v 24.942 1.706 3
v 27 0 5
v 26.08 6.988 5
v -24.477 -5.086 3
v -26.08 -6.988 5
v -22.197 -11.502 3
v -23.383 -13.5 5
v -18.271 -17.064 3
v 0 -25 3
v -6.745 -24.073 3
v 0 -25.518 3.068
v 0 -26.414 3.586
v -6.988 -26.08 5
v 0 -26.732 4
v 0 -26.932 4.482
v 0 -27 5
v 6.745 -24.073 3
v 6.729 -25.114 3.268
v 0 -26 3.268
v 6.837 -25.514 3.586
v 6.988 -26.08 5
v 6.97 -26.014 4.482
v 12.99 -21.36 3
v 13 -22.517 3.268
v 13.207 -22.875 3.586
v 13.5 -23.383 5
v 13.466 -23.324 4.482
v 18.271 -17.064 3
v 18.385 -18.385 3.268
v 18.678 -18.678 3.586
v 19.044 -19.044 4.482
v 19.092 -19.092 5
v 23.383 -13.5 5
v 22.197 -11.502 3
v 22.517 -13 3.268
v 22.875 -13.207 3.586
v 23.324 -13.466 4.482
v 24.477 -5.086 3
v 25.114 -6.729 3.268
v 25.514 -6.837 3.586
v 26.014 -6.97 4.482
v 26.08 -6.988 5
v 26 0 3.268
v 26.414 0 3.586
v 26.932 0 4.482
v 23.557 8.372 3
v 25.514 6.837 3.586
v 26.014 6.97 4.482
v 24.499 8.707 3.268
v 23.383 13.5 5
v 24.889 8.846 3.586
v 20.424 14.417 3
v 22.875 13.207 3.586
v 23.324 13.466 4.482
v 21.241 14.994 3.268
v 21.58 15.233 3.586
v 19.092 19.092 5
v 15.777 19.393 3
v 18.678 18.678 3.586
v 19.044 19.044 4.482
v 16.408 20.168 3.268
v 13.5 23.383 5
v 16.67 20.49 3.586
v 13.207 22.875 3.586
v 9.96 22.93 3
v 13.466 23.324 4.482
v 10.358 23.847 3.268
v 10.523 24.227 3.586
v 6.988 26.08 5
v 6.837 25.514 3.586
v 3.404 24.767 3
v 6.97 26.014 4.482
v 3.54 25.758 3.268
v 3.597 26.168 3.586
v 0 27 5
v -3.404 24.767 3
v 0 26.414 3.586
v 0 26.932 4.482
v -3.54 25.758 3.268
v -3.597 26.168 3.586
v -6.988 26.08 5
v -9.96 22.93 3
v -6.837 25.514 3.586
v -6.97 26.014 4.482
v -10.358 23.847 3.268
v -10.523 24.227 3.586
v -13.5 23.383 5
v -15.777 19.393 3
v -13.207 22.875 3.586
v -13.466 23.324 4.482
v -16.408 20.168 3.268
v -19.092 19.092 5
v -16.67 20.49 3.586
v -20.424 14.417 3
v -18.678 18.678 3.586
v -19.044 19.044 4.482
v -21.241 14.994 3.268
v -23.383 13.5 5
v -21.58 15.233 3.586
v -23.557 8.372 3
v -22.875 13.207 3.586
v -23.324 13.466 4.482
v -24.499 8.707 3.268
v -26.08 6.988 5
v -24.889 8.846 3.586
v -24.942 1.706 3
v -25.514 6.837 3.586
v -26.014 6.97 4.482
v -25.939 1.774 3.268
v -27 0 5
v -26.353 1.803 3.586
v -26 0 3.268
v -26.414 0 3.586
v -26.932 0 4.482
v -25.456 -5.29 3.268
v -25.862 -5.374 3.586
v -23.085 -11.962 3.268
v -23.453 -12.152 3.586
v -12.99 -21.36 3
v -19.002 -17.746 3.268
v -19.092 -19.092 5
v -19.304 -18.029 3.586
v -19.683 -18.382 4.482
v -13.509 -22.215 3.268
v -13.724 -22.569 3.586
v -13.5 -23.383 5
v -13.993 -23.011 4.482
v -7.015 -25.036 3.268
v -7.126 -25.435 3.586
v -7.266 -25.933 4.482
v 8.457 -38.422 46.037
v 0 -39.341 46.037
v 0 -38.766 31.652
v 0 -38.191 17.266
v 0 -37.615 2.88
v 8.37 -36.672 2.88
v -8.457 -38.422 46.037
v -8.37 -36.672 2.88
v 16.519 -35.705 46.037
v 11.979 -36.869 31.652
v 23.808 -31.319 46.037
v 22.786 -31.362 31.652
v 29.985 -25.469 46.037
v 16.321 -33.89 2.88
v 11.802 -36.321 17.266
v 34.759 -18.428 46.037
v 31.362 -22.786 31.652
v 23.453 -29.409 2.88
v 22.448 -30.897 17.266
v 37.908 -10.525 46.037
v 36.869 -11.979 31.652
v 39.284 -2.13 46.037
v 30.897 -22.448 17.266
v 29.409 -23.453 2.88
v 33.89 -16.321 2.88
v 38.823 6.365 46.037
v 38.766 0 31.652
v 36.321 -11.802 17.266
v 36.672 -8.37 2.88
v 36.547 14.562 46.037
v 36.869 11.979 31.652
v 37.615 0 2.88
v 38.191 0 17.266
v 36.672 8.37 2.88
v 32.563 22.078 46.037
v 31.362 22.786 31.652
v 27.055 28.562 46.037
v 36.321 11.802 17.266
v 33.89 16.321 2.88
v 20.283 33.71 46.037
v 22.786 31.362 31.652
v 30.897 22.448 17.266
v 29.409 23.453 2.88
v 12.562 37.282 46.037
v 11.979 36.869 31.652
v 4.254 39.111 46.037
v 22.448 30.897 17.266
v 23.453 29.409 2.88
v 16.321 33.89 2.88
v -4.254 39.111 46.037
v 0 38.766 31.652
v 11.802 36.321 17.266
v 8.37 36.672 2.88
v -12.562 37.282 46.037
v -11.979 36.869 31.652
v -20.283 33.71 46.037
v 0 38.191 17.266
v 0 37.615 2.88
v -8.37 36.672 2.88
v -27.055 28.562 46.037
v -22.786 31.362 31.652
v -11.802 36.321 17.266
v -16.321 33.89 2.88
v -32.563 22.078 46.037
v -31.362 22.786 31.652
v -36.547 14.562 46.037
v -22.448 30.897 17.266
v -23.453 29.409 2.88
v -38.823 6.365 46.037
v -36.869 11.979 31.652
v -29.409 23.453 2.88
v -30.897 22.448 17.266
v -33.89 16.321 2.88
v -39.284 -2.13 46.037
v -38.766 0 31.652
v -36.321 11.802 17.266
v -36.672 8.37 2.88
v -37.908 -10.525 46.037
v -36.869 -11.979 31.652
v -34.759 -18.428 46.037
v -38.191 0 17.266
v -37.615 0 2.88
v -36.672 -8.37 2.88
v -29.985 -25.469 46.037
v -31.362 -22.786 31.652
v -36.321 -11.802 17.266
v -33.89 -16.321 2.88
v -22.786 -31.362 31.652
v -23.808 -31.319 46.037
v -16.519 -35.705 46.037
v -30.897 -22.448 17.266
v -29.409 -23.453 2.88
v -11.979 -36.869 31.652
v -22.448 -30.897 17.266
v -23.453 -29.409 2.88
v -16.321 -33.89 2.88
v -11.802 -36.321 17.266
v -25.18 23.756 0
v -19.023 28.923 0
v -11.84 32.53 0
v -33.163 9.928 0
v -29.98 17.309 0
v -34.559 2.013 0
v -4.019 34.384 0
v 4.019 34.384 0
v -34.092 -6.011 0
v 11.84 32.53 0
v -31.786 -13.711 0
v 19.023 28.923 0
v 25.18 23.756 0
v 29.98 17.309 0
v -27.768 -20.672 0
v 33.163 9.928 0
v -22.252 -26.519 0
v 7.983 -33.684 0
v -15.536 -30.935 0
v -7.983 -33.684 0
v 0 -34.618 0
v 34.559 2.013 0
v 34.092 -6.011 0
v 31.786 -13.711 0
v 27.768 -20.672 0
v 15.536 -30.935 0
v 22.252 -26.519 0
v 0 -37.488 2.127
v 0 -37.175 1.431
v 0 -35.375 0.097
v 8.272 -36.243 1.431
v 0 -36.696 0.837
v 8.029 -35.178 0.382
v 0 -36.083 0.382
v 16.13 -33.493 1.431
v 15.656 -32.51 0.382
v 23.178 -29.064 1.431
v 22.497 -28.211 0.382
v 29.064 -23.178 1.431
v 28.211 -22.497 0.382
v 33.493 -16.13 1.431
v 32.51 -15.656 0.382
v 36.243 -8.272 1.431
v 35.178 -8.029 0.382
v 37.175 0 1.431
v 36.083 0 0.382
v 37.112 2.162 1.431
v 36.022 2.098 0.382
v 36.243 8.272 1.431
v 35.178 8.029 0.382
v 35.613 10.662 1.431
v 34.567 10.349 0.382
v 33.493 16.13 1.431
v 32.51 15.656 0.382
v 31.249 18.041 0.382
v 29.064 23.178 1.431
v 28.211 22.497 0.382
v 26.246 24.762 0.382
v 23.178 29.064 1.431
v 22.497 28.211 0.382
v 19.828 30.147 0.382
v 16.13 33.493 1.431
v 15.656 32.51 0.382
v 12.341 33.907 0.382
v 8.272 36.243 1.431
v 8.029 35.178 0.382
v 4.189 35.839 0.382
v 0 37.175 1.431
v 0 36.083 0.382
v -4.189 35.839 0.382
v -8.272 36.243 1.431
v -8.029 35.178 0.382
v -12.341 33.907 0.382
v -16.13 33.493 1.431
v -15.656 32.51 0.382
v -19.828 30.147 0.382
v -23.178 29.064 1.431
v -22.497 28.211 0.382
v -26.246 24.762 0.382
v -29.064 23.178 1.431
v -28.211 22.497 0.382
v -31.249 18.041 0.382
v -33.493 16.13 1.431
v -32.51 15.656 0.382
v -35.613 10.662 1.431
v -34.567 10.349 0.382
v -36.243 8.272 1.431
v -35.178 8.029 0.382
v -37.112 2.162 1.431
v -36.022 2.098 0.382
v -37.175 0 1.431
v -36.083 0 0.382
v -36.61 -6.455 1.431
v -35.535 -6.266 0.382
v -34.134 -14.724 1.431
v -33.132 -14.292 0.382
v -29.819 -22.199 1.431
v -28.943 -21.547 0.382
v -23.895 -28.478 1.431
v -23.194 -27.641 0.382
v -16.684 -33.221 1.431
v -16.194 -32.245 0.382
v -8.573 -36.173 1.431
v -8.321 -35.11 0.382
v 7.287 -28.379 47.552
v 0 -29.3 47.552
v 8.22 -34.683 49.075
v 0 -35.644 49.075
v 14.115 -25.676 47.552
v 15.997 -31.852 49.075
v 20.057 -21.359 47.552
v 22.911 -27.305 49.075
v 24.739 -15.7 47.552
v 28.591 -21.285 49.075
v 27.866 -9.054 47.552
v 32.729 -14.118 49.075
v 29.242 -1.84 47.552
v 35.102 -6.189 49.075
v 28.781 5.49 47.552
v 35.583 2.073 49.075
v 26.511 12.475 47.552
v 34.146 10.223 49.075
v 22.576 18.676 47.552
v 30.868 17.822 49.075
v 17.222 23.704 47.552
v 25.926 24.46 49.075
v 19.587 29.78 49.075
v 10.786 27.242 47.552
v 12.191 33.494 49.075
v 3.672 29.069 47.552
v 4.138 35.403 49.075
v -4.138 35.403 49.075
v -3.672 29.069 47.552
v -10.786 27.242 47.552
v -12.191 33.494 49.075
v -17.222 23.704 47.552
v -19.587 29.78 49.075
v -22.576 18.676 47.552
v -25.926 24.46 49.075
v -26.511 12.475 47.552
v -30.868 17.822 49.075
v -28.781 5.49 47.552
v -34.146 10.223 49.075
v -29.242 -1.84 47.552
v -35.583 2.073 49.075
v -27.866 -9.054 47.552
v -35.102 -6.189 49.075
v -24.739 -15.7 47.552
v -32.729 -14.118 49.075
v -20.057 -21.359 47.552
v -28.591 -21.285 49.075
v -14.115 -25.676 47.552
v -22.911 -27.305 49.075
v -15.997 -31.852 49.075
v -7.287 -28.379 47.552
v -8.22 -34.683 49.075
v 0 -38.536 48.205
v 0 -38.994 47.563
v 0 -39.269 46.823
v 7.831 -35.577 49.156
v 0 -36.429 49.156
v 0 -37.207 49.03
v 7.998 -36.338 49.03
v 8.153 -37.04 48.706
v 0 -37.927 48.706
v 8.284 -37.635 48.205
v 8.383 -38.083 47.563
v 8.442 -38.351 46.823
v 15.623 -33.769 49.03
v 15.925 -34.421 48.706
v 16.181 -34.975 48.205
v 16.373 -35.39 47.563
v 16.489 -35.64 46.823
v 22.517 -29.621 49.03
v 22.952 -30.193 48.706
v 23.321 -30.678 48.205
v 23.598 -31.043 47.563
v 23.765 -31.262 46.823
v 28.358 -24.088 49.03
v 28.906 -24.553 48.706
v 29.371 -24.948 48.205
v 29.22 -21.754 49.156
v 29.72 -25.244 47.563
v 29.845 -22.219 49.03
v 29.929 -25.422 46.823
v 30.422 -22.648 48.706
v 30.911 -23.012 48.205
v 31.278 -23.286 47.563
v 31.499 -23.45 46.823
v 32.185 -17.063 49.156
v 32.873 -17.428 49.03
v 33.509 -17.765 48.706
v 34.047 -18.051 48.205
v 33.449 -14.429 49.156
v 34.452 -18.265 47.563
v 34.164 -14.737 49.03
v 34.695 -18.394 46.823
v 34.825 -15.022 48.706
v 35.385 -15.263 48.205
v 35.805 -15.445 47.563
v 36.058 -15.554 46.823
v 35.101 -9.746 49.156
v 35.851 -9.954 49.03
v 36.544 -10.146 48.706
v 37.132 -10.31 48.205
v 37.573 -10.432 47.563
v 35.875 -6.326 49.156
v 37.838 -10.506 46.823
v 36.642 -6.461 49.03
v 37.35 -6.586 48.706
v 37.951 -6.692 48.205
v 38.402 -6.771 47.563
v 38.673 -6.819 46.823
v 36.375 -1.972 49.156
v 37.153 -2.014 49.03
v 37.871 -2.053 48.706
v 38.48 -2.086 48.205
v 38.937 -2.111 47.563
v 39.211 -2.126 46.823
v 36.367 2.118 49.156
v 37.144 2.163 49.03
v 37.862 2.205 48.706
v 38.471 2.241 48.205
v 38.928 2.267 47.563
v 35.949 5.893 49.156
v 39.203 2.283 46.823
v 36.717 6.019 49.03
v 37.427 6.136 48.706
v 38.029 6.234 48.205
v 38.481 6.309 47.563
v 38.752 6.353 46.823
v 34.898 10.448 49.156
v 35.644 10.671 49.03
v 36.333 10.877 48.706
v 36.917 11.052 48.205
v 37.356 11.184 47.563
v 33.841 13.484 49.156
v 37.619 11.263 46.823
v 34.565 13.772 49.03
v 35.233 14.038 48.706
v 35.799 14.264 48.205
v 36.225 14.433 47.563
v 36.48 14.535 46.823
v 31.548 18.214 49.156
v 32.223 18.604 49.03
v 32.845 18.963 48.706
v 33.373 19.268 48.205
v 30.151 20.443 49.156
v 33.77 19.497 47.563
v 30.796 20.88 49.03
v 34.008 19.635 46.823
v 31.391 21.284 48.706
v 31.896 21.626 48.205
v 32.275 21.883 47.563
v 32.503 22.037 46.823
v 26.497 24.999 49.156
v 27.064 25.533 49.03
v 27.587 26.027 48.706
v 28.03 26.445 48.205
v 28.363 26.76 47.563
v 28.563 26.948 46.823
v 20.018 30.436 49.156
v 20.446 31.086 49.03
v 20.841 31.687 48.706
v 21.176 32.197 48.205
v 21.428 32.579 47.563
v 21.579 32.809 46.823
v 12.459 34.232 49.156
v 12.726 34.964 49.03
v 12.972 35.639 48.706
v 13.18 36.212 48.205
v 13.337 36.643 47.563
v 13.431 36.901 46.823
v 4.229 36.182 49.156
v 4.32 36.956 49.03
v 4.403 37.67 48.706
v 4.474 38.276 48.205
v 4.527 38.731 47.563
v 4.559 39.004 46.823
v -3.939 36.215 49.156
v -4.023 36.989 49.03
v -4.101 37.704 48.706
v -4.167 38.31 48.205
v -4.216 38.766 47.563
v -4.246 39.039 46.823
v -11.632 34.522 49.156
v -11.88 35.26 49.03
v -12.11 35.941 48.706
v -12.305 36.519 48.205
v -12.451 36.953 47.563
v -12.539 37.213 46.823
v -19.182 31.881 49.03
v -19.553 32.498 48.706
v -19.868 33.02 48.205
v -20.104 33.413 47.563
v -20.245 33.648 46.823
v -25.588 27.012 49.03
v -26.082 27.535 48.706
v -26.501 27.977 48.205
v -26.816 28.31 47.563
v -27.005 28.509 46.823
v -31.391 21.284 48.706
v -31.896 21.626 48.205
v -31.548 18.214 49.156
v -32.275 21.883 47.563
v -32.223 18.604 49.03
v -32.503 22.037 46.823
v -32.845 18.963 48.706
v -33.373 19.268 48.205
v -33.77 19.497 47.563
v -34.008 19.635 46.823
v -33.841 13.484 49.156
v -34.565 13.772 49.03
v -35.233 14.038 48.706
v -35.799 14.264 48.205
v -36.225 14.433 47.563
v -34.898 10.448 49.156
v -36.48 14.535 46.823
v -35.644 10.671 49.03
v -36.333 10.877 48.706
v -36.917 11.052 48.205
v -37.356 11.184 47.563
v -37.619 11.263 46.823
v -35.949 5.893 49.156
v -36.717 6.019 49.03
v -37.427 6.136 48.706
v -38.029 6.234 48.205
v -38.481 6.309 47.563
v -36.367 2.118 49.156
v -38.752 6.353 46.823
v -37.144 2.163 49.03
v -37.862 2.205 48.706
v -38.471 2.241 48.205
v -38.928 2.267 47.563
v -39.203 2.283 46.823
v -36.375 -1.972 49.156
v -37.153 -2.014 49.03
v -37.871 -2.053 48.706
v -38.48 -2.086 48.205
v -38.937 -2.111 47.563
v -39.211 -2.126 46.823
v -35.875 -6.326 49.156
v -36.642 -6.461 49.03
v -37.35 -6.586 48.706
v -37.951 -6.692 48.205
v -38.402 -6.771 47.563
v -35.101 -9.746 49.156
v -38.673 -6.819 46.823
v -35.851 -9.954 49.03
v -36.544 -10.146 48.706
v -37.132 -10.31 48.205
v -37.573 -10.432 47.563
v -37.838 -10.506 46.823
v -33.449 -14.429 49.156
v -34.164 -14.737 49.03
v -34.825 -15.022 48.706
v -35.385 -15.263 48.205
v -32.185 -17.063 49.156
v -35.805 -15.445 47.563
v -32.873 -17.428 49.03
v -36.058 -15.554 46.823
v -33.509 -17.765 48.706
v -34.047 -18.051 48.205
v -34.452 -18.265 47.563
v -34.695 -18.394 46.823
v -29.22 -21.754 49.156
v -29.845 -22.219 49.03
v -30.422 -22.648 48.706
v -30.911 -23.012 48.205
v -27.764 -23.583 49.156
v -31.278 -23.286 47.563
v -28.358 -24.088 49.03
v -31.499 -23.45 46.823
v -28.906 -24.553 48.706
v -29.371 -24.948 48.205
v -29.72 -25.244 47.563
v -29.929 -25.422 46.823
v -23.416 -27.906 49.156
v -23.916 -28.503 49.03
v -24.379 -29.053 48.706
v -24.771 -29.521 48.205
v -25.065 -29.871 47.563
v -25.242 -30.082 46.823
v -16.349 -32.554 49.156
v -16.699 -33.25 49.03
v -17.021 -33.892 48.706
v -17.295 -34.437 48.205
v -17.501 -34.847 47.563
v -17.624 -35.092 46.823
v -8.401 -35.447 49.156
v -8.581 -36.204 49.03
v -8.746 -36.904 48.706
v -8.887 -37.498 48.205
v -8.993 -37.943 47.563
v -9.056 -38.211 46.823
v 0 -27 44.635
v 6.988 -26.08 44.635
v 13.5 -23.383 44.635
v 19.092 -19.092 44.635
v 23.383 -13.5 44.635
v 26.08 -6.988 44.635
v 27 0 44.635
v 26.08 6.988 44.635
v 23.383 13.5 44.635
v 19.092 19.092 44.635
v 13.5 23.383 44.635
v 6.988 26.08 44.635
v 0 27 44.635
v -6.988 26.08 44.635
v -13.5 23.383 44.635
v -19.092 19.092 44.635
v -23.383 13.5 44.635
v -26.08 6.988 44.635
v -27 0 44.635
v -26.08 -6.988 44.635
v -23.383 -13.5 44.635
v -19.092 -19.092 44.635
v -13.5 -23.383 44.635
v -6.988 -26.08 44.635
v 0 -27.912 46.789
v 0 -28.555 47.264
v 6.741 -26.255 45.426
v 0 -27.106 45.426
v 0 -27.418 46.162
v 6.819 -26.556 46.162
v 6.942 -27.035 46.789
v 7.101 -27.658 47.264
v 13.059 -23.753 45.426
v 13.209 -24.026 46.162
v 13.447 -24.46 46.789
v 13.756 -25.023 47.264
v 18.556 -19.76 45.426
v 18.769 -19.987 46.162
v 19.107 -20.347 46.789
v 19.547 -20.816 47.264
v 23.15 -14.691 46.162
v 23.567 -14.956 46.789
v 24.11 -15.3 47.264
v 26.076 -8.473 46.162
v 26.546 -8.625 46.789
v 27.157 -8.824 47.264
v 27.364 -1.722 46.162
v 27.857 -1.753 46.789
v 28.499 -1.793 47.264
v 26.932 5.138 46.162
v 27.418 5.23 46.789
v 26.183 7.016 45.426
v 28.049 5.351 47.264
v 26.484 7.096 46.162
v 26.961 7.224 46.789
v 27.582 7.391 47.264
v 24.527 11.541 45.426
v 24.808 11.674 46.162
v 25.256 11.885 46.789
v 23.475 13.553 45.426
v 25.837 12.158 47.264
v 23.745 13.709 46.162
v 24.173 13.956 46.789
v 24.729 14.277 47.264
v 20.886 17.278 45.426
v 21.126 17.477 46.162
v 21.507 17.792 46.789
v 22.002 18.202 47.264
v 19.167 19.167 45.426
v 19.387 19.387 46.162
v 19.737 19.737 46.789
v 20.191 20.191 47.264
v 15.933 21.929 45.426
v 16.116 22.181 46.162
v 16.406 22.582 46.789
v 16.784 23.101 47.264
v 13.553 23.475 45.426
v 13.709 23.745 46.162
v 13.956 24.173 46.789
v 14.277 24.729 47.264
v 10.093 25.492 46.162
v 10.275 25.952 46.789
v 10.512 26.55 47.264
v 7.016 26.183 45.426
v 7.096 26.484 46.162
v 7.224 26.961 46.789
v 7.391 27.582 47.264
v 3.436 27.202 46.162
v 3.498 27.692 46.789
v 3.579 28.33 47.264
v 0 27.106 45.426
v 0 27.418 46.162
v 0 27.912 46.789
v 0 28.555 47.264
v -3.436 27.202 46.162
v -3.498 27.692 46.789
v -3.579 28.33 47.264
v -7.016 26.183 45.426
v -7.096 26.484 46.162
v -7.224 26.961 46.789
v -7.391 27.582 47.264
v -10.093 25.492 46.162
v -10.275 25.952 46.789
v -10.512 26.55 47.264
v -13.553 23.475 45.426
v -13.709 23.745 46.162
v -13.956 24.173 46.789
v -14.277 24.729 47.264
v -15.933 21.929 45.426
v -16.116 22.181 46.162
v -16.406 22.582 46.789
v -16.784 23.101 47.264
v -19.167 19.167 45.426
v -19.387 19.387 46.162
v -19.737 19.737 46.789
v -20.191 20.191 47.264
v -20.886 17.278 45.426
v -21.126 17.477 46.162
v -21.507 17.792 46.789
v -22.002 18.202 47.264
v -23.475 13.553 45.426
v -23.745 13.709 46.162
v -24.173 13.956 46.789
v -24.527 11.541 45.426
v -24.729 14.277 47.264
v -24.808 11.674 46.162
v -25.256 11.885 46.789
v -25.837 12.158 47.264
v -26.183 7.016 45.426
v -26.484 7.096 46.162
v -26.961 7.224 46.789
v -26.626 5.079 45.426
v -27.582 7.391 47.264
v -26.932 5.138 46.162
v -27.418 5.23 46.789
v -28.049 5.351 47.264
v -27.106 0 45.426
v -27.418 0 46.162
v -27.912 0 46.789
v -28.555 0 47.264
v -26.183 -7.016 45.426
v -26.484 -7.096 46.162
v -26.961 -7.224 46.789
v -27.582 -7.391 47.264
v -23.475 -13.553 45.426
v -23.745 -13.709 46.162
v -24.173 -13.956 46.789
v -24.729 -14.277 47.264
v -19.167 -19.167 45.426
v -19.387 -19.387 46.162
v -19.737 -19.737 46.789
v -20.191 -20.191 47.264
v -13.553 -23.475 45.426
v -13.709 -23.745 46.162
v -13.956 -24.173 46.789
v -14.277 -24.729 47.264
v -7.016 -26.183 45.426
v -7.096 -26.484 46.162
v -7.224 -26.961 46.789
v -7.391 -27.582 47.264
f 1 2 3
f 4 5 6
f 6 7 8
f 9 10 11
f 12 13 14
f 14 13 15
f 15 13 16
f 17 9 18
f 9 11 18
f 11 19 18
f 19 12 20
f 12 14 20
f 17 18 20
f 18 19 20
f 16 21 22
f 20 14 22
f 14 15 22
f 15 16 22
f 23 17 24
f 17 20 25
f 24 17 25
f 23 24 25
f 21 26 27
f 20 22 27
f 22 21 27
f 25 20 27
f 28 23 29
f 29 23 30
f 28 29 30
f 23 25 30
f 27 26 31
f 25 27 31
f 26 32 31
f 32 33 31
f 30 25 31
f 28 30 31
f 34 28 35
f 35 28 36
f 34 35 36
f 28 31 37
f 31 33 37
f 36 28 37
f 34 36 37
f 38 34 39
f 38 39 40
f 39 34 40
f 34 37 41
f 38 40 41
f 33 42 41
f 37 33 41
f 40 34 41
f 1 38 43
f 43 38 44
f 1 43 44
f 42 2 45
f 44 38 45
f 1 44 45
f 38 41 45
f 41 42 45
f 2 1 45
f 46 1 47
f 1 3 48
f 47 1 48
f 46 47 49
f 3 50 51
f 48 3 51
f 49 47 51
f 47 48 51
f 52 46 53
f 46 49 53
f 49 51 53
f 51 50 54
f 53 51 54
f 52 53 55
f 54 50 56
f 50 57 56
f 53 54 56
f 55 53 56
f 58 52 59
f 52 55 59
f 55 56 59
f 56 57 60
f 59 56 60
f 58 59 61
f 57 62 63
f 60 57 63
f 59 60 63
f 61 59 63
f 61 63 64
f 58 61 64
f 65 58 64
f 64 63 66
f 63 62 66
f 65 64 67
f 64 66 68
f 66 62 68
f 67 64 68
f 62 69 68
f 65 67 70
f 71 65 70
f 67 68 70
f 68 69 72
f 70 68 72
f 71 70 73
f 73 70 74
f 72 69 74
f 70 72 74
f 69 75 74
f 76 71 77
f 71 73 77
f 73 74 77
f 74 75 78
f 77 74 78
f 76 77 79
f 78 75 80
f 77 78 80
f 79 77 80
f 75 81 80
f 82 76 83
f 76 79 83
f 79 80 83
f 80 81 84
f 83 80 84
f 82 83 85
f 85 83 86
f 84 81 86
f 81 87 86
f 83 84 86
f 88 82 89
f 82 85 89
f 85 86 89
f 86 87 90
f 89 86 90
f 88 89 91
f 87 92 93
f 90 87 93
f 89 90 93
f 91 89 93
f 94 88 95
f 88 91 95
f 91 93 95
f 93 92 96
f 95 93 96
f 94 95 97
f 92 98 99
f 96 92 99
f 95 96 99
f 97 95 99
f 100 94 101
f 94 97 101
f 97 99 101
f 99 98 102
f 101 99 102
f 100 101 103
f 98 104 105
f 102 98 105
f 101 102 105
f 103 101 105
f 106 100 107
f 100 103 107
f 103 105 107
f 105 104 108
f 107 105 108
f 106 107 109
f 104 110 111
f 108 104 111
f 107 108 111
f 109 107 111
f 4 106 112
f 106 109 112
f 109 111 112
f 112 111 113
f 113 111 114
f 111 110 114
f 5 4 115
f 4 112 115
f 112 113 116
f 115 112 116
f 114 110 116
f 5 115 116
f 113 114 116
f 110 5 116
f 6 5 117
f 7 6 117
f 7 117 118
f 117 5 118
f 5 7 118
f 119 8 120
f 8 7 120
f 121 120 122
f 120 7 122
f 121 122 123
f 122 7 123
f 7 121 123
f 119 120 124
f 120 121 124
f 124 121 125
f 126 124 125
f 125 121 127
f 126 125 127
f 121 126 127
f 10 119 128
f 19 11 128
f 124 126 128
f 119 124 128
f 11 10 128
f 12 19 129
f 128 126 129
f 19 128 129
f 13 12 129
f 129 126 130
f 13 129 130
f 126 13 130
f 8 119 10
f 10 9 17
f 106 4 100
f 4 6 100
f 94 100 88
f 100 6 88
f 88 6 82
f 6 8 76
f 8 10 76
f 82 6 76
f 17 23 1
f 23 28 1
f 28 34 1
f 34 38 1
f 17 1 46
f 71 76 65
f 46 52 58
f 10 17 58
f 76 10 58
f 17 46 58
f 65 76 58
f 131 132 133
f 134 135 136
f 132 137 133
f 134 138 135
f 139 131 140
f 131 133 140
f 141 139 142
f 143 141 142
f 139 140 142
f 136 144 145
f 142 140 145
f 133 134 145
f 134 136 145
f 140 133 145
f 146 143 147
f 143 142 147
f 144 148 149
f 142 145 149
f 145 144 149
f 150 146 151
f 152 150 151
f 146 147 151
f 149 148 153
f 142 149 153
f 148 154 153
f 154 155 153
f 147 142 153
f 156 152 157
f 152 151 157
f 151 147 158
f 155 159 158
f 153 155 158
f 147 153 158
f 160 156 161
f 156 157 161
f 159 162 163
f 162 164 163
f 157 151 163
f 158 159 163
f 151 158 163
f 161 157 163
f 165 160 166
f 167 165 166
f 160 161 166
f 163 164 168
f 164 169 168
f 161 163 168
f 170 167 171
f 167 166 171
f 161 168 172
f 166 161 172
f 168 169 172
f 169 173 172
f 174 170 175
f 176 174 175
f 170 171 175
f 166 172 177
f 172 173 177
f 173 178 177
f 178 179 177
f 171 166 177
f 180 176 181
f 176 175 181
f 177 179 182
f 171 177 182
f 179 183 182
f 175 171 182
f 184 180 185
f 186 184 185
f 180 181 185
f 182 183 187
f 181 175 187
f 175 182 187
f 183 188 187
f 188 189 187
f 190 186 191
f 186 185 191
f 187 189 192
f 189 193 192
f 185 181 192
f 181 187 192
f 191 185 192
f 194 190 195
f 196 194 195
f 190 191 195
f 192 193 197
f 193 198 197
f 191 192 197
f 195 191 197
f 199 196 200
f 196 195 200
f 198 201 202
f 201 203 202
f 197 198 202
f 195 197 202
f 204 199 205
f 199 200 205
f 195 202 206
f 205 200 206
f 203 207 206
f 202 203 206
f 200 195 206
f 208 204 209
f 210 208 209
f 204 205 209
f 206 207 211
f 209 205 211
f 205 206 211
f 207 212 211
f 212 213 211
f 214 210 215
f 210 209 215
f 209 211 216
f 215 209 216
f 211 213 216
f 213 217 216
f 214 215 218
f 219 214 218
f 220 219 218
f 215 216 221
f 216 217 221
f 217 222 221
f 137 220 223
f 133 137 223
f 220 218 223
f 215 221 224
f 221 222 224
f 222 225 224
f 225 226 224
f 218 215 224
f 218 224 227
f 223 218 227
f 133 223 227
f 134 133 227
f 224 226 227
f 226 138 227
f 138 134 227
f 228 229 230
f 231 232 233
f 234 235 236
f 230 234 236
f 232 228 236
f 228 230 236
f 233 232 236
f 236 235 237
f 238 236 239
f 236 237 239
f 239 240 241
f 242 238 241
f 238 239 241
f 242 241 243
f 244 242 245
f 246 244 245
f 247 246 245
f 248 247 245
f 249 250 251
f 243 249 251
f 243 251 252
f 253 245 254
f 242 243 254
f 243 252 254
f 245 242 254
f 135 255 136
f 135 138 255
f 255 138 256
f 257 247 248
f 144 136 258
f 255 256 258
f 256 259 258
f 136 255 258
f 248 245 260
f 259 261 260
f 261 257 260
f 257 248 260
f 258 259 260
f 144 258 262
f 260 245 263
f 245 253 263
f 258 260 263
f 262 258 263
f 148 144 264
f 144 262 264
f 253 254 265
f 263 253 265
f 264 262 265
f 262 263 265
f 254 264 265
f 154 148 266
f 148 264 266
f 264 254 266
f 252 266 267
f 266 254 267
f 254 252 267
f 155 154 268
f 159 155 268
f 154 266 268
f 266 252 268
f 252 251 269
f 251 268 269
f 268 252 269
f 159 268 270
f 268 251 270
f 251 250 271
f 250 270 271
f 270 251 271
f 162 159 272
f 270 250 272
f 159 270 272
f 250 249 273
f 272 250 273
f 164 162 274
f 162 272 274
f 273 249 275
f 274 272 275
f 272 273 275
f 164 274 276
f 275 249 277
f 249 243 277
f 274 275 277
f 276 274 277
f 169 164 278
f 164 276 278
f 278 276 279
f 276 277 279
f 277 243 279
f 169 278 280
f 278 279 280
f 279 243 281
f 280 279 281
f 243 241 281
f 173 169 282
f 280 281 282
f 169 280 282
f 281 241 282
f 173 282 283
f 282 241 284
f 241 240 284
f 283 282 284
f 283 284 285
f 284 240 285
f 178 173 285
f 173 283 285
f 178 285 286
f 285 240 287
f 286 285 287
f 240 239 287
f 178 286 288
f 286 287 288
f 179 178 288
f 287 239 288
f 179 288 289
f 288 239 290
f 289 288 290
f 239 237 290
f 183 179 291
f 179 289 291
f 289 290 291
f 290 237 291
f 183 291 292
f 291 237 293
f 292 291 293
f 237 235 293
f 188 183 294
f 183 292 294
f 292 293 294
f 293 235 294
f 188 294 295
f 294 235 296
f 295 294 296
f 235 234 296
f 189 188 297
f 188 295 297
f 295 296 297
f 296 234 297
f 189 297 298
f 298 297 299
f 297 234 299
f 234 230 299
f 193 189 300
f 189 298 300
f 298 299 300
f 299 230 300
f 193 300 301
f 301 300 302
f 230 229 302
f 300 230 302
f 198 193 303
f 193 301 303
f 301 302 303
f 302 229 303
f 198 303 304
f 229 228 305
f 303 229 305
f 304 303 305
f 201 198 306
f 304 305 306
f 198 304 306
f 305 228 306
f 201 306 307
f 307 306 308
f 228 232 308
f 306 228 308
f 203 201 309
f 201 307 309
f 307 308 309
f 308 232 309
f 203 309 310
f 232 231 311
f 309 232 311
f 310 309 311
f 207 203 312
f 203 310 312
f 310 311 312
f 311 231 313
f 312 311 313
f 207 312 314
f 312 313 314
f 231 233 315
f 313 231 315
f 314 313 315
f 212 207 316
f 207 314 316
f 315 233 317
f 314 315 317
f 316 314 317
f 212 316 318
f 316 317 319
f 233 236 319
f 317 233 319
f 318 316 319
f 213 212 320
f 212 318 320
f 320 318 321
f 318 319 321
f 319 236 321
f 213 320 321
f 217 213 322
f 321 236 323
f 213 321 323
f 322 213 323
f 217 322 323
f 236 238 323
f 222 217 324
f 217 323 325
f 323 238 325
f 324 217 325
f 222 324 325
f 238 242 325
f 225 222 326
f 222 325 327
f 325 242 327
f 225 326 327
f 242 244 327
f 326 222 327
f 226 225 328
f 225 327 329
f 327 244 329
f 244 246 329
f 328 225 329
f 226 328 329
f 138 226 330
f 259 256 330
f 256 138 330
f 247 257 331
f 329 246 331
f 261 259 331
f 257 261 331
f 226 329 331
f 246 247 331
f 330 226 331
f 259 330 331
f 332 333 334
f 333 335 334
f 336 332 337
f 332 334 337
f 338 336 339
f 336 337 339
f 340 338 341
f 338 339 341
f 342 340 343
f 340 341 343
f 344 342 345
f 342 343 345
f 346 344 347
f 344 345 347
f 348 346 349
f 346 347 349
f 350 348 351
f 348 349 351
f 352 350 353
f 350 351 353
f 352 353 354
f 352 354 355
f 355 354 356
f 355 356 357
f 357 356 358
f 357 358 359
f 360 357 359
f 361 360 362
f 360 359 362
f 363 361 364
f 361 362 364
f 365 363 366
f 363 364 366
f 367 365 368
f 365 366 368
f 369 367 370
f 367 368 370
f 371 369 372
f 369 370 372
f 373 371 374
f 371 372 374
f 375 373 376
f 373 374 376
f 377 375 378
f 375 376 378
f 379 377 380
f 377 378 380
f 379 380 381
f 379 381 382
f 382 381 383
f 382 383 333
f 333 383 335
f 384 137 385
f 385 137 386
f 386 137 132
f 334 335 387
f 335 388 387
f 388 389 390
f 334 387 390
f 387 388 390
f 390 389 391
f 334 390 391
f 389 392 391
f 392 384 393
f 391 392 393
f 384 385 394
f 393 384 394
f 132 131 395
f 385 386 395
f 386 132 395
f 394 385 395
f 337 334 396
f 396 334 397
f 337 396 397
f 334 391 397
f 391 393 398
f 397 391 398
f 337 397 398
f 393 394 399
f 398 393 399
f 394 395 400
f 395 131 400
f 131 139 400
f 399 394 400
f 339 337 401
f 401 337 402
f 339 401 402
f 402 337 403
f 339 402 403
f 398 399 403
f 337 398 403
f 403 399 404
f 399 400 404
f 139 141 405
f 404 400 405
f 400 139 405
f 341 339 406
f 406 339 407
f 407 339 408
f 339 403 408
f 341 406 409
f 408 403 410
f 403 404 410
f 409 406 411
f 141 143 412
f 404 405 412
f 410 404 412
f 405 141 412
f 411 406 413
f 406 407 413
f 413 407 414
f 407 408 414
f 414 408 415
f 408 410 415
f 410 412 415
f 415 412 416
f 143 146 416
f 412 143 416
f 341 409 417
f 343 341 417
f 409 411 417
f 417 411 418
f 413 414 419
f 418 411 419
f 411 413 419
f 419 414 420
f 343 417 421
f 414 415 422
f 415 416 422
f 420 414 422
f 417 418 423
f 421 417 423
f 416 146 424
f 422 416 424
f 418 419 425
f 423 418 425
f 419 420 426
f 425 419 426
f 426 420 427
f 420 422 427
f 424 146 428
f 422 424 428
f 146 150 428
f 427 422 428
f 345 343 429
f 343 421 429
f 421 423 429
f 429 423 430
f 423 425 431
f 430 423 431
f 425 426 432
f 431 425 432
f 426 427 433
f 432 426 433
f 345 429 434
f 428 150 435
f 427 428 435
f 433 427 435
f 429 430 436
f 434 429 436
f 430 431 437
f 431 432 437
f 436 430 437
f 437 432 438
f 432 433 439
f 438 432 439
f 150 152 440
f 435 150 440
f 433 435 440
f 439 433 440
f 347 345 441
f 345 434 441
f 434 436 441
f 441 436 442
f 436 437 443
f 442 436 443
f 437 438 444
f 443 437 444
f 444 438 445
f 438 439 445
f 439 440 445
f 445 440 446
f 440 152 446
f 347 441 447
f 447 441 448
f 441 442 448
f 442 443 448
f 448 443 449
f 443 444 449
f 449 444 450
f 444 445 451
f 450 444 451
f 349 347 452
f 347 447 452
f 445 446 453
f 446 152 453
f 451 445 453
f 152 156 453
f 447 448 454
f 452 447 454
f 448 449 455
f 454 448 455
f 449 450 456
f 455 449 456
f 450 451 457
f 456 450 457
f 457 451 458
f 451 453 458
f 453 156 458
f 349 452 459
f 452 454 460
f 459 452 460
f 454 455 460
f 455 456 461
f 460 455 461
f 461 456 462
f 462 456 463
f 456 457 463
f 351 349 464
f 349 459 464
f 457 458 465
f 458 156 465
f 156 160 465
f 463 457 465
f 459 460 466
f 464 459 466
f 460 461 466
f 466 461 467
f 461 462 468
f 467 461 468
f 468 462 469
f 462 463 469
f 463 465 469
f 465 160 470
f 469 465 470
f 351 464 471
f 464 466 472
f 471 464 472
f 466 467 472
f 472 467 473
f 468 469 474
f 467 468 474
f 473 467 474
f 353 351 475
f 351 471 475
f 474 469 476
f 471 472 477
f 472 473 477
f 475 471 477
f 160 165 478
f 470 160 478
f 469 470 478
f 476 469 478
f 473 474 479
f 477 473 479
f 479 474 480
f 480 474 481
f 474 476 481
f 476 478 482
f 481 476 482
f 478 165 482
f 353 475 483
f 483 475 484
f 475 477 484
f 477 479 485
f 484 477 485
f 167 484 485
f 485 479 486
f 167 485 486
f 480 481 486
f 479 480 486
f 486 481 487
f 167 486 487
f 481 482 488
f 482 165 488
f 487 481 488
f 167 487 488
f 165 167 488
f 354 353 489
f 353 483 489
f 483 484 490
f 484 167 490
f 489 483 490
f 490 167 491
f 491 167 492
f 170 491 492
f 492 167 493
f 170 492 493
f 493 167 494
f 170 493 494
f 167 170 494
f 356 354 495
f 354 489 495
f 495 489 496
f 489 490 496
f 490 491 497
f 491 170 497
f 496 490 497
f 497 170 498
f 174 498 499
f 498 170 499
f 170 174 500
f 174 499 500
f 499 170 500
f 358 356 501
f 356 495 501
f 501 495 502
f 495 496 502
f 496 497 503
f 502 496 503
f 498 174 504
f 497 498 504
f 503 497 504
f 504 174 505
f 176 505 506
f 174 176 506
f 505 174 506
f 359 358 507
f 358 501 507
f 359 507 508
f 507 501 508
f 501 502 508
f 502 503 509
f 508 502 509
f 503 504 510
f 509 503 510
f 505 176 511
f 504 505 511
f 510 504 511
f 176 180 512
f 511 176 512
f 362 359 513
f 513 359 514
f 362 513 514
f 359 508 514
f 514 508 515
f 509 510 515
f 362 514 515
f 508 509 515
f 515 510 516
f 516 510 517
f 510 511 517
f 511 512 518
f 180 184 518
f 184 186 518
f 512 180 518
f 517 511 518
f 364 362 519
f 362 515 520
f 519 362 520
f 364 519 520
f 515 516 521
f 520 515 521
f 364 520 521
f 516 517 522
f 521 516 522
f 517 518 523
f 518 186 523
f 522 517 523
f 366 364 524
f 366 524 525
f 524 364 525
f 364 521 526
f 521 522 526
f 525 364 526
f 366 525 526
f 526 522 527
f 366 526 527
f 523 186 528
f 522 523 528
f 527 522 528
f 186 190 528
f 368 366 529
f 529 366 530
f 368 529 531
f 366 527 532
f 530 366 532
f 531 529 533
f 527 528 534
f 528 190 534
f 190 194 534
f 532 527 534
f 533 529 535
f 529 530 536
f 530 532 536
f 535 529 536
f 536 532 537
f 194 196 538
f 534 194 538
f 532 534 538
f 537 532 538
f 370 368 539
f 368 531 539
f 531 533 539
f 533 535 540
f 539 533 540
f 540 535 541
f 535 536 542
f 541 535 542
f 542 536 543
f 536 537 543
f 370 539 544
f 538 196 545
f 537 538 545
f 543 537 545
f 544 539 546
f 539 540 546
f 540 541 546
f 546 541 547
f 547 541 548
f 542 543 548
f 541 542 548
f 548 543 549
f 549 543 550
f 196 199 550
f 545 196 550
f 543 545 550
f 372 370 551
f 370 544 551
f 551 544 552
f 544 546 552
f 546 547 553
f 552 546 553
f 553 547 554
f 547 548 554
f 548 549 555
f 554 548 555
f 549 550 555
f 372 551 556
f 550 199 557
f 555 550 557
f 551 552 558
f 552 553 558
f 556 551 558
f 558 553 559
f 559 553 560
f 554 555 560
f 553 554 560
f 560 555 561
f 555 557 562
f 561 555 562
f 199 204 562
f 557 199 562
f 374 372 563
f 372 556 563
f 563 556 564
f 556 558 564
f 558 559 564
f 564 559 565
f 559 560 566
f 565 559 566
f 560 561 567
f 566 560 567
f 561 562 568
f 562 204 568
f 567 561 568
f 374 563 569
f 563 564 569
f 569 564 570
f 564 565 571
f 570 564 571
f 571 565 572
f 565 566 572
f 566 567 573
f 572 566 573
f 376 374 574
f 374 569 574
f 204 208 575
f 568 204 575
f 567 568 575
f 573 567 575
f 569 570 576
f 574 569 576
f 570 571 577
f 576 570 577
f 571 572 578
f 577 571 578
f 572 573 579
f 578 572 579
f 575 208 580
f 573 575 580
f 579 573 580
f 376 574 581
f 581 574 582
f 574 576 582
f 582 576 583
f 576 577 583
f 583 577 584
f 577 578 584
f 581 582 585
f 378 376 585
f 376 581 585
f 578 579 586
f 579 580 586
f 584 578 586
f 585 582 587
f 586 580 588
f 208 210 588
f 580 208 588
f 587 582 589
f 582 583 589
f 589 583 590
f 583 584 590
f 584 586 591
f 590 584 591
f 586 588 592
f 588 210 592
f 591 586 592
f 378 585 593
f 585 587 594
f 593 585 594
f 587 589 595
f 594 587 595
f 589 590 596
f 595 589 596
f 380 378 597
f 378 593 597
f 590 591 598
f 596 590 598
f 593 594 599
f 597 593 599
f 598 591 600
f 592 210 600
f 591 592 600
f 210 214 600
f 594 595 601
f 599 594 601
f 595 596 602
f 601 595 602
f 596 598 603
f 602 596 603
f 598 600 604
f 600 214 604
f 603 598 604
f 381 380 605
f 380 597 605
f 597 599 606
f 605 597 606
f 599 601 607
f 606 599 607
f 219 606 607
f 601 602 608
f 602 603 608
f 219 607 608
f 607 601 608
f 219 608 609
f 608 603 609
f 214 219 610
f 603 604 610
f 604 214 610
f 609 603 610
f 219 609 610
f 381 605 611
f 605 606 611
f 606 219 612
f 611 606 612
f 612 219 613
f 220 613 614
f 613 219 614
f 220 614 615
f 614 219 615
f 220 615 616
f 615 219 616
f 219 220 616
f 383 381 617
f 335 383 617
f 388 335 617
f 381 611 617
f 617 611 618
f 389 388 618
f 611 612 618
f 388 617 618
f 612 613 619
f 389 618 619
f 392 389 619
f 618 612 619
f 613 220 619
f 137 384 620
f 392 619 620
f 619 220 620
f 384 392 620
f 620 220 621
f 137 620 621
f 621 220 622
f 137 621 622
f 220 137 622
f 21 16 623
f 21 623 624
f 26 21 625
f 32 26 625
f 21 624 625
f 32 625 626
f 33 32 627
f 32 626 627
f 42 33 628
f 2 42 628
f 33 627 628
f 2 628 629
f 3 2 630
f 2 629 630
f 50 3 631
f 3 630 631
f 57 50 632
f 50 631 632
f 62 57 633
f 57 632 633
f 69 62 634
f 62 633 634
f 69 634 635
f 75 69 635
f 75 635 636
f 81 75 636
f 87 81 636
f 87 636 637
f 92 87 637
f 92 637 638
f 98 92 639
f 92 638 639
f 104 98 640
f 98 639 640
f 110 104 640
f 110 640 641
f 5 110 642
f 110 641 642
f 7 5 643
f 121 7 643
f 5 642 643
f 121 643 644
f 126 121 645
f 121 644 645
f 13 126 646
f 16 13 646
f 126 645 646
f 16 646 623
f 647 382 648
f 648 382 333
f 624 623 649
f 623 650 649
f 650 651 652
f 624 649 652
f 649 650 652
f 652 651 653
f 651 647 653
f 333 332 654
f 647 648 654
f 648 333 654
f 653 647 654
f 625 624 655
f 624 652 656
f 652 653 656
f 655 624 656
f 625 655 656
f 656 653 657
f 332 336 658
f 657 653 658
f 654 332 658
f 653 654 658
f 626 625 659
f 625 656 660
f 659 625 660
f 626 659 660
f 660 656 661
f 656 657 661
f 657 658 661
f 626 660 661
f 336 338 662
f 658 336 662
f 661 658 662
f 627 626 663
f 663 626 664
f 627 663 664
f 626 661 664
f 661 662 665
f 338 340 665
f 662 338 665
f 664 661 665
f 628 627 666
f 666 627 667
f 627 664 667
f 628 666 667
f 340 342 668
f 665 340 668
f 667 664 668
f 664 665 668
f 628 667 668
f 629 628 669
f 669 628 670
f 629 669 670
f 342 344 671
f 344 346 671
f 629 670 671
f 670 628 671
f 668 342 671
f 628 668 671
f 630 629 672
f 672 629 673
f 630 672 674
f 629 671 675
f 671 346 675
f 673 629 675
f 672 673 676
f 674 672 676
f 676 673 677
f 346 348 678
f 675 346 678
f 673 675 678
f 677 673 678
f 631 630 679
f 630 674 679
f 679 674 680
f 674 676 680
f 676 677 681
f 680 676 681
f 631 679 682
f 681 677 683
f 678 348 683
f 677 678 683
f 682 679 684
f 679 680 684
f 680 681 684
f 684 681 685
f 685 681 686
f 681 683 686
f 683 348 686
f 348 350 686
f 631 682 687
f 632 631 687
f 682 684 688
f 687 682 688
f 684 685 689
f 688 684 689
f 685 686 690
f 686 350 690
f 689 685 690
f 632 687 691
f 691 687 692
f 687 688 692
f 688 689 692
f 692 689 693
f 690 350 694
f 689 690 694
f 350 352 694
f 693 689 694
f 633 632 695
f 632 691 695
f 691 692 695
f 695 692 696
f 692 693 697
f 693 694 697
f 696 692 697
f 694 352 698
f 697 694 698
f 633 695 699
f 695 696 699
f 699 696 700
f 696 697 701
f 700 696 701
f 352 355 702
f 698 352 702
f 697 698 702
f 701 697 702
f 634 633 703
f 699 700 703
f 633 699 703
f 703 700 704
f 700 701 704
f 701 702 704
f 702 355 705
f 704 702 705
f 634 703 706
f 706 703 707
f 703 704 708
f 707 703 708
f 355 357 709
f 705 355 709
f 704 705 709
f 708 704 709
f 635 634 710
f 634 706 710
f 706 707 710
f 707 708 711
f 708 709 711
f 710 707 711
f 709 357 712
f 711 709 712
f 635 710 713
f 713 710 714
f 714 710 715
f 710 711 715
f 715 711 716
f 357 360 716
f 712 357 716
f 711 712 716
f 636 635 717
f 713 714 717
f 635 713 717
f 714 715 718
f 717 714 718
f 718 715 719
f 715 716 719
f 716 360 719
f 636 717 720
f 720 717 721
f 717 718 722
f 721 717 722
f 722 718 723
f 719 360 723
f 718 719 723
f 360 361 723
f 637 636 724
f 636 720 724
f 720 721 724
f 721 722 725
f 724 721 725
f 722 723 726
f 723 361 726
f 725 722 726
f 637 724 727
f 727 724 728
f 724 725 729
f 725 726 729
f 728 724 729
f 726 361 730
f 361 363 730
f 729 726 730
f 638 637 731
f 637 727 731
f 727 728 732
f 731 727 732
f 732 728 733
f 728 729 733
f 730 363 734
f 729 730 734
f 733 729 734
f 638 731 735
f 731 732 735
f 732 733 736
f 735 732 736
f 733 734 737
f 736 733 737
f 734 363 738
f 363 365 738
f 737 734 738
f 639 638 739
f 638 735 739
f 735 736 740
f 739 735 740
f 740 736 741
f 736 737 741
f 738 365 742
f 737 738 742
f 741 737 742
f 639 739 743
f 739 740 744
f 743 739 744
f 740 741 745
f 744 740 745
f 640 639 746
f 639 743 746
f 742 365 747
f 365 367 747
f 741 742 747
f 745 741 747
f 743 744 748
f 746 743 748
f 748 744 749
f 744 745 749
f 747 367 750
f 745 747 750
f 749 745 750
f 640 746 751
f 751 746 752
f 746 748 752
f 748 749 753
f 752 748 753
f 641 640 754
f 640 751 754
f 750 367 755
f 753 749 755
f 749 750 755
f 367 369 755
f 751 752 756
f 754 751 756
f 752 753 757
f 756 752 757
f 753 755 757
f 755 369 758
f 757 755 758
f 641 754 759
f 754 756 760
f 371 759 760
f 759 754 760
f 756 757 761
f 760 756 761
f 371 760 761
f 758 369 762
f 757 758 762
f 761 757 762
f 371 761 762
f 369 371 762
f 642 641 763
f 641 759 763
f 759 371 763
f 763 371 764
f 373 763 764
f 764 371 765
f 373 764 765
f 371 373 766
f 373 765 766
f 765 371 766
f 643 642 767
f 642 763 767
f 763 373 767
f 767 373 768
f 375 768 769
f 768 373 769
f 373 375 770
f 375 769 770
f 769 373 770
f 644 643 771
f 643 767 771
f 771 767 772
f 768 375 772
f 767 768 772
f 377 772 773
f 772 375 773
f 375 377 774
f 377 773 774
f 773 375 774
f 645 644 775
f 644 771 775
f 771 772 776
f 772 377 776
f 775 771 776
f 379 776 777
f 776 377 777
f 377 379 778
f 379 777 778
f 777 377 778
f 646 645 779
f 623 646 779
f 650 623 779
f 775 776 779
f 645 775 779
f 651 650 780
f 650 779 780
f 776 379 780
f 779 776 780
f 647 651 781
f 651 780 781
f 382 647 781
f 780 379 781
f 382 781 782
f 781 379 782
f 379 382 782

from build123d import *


with BuildPart() as f1:
    # F0 (on Right) → F1 (revolve)
    with BuildSketch(Plane.YZ):
        with BuildLine():
            ThreePointArc((-35.643776, 49.074506), (-38.247983, 48.47563), (-39.341498, 46.03744))
            Line((-39.341498, 46.03744), (-37.615204, 2.880096))
            ThreePointArc((-37.615204, 2.880096), (-36.696097, 0.836702), (-34.617601, 0))
            Line((-34.617601, 0), (0, 0))
            Line((0, 0), (0, 3))
            Line((0, 3), (-25, 3))
            ThreePointArc((-25, 3), (-26.414214, 3.585786), (-27, 5))
            Line((-27, 5), (-27, 44.63481))
            ThreePointArc((-27, 44.63481), (-27.644118, 46.492179), (-29.299881, 47.551971))
            Line((-29.299881, 47.551971), (-35.643776, 49.074506))
        make_face()
    revolve(axis=Axis((0, 0, 1.5), (0, 0, 1)))


solid = f1.part
